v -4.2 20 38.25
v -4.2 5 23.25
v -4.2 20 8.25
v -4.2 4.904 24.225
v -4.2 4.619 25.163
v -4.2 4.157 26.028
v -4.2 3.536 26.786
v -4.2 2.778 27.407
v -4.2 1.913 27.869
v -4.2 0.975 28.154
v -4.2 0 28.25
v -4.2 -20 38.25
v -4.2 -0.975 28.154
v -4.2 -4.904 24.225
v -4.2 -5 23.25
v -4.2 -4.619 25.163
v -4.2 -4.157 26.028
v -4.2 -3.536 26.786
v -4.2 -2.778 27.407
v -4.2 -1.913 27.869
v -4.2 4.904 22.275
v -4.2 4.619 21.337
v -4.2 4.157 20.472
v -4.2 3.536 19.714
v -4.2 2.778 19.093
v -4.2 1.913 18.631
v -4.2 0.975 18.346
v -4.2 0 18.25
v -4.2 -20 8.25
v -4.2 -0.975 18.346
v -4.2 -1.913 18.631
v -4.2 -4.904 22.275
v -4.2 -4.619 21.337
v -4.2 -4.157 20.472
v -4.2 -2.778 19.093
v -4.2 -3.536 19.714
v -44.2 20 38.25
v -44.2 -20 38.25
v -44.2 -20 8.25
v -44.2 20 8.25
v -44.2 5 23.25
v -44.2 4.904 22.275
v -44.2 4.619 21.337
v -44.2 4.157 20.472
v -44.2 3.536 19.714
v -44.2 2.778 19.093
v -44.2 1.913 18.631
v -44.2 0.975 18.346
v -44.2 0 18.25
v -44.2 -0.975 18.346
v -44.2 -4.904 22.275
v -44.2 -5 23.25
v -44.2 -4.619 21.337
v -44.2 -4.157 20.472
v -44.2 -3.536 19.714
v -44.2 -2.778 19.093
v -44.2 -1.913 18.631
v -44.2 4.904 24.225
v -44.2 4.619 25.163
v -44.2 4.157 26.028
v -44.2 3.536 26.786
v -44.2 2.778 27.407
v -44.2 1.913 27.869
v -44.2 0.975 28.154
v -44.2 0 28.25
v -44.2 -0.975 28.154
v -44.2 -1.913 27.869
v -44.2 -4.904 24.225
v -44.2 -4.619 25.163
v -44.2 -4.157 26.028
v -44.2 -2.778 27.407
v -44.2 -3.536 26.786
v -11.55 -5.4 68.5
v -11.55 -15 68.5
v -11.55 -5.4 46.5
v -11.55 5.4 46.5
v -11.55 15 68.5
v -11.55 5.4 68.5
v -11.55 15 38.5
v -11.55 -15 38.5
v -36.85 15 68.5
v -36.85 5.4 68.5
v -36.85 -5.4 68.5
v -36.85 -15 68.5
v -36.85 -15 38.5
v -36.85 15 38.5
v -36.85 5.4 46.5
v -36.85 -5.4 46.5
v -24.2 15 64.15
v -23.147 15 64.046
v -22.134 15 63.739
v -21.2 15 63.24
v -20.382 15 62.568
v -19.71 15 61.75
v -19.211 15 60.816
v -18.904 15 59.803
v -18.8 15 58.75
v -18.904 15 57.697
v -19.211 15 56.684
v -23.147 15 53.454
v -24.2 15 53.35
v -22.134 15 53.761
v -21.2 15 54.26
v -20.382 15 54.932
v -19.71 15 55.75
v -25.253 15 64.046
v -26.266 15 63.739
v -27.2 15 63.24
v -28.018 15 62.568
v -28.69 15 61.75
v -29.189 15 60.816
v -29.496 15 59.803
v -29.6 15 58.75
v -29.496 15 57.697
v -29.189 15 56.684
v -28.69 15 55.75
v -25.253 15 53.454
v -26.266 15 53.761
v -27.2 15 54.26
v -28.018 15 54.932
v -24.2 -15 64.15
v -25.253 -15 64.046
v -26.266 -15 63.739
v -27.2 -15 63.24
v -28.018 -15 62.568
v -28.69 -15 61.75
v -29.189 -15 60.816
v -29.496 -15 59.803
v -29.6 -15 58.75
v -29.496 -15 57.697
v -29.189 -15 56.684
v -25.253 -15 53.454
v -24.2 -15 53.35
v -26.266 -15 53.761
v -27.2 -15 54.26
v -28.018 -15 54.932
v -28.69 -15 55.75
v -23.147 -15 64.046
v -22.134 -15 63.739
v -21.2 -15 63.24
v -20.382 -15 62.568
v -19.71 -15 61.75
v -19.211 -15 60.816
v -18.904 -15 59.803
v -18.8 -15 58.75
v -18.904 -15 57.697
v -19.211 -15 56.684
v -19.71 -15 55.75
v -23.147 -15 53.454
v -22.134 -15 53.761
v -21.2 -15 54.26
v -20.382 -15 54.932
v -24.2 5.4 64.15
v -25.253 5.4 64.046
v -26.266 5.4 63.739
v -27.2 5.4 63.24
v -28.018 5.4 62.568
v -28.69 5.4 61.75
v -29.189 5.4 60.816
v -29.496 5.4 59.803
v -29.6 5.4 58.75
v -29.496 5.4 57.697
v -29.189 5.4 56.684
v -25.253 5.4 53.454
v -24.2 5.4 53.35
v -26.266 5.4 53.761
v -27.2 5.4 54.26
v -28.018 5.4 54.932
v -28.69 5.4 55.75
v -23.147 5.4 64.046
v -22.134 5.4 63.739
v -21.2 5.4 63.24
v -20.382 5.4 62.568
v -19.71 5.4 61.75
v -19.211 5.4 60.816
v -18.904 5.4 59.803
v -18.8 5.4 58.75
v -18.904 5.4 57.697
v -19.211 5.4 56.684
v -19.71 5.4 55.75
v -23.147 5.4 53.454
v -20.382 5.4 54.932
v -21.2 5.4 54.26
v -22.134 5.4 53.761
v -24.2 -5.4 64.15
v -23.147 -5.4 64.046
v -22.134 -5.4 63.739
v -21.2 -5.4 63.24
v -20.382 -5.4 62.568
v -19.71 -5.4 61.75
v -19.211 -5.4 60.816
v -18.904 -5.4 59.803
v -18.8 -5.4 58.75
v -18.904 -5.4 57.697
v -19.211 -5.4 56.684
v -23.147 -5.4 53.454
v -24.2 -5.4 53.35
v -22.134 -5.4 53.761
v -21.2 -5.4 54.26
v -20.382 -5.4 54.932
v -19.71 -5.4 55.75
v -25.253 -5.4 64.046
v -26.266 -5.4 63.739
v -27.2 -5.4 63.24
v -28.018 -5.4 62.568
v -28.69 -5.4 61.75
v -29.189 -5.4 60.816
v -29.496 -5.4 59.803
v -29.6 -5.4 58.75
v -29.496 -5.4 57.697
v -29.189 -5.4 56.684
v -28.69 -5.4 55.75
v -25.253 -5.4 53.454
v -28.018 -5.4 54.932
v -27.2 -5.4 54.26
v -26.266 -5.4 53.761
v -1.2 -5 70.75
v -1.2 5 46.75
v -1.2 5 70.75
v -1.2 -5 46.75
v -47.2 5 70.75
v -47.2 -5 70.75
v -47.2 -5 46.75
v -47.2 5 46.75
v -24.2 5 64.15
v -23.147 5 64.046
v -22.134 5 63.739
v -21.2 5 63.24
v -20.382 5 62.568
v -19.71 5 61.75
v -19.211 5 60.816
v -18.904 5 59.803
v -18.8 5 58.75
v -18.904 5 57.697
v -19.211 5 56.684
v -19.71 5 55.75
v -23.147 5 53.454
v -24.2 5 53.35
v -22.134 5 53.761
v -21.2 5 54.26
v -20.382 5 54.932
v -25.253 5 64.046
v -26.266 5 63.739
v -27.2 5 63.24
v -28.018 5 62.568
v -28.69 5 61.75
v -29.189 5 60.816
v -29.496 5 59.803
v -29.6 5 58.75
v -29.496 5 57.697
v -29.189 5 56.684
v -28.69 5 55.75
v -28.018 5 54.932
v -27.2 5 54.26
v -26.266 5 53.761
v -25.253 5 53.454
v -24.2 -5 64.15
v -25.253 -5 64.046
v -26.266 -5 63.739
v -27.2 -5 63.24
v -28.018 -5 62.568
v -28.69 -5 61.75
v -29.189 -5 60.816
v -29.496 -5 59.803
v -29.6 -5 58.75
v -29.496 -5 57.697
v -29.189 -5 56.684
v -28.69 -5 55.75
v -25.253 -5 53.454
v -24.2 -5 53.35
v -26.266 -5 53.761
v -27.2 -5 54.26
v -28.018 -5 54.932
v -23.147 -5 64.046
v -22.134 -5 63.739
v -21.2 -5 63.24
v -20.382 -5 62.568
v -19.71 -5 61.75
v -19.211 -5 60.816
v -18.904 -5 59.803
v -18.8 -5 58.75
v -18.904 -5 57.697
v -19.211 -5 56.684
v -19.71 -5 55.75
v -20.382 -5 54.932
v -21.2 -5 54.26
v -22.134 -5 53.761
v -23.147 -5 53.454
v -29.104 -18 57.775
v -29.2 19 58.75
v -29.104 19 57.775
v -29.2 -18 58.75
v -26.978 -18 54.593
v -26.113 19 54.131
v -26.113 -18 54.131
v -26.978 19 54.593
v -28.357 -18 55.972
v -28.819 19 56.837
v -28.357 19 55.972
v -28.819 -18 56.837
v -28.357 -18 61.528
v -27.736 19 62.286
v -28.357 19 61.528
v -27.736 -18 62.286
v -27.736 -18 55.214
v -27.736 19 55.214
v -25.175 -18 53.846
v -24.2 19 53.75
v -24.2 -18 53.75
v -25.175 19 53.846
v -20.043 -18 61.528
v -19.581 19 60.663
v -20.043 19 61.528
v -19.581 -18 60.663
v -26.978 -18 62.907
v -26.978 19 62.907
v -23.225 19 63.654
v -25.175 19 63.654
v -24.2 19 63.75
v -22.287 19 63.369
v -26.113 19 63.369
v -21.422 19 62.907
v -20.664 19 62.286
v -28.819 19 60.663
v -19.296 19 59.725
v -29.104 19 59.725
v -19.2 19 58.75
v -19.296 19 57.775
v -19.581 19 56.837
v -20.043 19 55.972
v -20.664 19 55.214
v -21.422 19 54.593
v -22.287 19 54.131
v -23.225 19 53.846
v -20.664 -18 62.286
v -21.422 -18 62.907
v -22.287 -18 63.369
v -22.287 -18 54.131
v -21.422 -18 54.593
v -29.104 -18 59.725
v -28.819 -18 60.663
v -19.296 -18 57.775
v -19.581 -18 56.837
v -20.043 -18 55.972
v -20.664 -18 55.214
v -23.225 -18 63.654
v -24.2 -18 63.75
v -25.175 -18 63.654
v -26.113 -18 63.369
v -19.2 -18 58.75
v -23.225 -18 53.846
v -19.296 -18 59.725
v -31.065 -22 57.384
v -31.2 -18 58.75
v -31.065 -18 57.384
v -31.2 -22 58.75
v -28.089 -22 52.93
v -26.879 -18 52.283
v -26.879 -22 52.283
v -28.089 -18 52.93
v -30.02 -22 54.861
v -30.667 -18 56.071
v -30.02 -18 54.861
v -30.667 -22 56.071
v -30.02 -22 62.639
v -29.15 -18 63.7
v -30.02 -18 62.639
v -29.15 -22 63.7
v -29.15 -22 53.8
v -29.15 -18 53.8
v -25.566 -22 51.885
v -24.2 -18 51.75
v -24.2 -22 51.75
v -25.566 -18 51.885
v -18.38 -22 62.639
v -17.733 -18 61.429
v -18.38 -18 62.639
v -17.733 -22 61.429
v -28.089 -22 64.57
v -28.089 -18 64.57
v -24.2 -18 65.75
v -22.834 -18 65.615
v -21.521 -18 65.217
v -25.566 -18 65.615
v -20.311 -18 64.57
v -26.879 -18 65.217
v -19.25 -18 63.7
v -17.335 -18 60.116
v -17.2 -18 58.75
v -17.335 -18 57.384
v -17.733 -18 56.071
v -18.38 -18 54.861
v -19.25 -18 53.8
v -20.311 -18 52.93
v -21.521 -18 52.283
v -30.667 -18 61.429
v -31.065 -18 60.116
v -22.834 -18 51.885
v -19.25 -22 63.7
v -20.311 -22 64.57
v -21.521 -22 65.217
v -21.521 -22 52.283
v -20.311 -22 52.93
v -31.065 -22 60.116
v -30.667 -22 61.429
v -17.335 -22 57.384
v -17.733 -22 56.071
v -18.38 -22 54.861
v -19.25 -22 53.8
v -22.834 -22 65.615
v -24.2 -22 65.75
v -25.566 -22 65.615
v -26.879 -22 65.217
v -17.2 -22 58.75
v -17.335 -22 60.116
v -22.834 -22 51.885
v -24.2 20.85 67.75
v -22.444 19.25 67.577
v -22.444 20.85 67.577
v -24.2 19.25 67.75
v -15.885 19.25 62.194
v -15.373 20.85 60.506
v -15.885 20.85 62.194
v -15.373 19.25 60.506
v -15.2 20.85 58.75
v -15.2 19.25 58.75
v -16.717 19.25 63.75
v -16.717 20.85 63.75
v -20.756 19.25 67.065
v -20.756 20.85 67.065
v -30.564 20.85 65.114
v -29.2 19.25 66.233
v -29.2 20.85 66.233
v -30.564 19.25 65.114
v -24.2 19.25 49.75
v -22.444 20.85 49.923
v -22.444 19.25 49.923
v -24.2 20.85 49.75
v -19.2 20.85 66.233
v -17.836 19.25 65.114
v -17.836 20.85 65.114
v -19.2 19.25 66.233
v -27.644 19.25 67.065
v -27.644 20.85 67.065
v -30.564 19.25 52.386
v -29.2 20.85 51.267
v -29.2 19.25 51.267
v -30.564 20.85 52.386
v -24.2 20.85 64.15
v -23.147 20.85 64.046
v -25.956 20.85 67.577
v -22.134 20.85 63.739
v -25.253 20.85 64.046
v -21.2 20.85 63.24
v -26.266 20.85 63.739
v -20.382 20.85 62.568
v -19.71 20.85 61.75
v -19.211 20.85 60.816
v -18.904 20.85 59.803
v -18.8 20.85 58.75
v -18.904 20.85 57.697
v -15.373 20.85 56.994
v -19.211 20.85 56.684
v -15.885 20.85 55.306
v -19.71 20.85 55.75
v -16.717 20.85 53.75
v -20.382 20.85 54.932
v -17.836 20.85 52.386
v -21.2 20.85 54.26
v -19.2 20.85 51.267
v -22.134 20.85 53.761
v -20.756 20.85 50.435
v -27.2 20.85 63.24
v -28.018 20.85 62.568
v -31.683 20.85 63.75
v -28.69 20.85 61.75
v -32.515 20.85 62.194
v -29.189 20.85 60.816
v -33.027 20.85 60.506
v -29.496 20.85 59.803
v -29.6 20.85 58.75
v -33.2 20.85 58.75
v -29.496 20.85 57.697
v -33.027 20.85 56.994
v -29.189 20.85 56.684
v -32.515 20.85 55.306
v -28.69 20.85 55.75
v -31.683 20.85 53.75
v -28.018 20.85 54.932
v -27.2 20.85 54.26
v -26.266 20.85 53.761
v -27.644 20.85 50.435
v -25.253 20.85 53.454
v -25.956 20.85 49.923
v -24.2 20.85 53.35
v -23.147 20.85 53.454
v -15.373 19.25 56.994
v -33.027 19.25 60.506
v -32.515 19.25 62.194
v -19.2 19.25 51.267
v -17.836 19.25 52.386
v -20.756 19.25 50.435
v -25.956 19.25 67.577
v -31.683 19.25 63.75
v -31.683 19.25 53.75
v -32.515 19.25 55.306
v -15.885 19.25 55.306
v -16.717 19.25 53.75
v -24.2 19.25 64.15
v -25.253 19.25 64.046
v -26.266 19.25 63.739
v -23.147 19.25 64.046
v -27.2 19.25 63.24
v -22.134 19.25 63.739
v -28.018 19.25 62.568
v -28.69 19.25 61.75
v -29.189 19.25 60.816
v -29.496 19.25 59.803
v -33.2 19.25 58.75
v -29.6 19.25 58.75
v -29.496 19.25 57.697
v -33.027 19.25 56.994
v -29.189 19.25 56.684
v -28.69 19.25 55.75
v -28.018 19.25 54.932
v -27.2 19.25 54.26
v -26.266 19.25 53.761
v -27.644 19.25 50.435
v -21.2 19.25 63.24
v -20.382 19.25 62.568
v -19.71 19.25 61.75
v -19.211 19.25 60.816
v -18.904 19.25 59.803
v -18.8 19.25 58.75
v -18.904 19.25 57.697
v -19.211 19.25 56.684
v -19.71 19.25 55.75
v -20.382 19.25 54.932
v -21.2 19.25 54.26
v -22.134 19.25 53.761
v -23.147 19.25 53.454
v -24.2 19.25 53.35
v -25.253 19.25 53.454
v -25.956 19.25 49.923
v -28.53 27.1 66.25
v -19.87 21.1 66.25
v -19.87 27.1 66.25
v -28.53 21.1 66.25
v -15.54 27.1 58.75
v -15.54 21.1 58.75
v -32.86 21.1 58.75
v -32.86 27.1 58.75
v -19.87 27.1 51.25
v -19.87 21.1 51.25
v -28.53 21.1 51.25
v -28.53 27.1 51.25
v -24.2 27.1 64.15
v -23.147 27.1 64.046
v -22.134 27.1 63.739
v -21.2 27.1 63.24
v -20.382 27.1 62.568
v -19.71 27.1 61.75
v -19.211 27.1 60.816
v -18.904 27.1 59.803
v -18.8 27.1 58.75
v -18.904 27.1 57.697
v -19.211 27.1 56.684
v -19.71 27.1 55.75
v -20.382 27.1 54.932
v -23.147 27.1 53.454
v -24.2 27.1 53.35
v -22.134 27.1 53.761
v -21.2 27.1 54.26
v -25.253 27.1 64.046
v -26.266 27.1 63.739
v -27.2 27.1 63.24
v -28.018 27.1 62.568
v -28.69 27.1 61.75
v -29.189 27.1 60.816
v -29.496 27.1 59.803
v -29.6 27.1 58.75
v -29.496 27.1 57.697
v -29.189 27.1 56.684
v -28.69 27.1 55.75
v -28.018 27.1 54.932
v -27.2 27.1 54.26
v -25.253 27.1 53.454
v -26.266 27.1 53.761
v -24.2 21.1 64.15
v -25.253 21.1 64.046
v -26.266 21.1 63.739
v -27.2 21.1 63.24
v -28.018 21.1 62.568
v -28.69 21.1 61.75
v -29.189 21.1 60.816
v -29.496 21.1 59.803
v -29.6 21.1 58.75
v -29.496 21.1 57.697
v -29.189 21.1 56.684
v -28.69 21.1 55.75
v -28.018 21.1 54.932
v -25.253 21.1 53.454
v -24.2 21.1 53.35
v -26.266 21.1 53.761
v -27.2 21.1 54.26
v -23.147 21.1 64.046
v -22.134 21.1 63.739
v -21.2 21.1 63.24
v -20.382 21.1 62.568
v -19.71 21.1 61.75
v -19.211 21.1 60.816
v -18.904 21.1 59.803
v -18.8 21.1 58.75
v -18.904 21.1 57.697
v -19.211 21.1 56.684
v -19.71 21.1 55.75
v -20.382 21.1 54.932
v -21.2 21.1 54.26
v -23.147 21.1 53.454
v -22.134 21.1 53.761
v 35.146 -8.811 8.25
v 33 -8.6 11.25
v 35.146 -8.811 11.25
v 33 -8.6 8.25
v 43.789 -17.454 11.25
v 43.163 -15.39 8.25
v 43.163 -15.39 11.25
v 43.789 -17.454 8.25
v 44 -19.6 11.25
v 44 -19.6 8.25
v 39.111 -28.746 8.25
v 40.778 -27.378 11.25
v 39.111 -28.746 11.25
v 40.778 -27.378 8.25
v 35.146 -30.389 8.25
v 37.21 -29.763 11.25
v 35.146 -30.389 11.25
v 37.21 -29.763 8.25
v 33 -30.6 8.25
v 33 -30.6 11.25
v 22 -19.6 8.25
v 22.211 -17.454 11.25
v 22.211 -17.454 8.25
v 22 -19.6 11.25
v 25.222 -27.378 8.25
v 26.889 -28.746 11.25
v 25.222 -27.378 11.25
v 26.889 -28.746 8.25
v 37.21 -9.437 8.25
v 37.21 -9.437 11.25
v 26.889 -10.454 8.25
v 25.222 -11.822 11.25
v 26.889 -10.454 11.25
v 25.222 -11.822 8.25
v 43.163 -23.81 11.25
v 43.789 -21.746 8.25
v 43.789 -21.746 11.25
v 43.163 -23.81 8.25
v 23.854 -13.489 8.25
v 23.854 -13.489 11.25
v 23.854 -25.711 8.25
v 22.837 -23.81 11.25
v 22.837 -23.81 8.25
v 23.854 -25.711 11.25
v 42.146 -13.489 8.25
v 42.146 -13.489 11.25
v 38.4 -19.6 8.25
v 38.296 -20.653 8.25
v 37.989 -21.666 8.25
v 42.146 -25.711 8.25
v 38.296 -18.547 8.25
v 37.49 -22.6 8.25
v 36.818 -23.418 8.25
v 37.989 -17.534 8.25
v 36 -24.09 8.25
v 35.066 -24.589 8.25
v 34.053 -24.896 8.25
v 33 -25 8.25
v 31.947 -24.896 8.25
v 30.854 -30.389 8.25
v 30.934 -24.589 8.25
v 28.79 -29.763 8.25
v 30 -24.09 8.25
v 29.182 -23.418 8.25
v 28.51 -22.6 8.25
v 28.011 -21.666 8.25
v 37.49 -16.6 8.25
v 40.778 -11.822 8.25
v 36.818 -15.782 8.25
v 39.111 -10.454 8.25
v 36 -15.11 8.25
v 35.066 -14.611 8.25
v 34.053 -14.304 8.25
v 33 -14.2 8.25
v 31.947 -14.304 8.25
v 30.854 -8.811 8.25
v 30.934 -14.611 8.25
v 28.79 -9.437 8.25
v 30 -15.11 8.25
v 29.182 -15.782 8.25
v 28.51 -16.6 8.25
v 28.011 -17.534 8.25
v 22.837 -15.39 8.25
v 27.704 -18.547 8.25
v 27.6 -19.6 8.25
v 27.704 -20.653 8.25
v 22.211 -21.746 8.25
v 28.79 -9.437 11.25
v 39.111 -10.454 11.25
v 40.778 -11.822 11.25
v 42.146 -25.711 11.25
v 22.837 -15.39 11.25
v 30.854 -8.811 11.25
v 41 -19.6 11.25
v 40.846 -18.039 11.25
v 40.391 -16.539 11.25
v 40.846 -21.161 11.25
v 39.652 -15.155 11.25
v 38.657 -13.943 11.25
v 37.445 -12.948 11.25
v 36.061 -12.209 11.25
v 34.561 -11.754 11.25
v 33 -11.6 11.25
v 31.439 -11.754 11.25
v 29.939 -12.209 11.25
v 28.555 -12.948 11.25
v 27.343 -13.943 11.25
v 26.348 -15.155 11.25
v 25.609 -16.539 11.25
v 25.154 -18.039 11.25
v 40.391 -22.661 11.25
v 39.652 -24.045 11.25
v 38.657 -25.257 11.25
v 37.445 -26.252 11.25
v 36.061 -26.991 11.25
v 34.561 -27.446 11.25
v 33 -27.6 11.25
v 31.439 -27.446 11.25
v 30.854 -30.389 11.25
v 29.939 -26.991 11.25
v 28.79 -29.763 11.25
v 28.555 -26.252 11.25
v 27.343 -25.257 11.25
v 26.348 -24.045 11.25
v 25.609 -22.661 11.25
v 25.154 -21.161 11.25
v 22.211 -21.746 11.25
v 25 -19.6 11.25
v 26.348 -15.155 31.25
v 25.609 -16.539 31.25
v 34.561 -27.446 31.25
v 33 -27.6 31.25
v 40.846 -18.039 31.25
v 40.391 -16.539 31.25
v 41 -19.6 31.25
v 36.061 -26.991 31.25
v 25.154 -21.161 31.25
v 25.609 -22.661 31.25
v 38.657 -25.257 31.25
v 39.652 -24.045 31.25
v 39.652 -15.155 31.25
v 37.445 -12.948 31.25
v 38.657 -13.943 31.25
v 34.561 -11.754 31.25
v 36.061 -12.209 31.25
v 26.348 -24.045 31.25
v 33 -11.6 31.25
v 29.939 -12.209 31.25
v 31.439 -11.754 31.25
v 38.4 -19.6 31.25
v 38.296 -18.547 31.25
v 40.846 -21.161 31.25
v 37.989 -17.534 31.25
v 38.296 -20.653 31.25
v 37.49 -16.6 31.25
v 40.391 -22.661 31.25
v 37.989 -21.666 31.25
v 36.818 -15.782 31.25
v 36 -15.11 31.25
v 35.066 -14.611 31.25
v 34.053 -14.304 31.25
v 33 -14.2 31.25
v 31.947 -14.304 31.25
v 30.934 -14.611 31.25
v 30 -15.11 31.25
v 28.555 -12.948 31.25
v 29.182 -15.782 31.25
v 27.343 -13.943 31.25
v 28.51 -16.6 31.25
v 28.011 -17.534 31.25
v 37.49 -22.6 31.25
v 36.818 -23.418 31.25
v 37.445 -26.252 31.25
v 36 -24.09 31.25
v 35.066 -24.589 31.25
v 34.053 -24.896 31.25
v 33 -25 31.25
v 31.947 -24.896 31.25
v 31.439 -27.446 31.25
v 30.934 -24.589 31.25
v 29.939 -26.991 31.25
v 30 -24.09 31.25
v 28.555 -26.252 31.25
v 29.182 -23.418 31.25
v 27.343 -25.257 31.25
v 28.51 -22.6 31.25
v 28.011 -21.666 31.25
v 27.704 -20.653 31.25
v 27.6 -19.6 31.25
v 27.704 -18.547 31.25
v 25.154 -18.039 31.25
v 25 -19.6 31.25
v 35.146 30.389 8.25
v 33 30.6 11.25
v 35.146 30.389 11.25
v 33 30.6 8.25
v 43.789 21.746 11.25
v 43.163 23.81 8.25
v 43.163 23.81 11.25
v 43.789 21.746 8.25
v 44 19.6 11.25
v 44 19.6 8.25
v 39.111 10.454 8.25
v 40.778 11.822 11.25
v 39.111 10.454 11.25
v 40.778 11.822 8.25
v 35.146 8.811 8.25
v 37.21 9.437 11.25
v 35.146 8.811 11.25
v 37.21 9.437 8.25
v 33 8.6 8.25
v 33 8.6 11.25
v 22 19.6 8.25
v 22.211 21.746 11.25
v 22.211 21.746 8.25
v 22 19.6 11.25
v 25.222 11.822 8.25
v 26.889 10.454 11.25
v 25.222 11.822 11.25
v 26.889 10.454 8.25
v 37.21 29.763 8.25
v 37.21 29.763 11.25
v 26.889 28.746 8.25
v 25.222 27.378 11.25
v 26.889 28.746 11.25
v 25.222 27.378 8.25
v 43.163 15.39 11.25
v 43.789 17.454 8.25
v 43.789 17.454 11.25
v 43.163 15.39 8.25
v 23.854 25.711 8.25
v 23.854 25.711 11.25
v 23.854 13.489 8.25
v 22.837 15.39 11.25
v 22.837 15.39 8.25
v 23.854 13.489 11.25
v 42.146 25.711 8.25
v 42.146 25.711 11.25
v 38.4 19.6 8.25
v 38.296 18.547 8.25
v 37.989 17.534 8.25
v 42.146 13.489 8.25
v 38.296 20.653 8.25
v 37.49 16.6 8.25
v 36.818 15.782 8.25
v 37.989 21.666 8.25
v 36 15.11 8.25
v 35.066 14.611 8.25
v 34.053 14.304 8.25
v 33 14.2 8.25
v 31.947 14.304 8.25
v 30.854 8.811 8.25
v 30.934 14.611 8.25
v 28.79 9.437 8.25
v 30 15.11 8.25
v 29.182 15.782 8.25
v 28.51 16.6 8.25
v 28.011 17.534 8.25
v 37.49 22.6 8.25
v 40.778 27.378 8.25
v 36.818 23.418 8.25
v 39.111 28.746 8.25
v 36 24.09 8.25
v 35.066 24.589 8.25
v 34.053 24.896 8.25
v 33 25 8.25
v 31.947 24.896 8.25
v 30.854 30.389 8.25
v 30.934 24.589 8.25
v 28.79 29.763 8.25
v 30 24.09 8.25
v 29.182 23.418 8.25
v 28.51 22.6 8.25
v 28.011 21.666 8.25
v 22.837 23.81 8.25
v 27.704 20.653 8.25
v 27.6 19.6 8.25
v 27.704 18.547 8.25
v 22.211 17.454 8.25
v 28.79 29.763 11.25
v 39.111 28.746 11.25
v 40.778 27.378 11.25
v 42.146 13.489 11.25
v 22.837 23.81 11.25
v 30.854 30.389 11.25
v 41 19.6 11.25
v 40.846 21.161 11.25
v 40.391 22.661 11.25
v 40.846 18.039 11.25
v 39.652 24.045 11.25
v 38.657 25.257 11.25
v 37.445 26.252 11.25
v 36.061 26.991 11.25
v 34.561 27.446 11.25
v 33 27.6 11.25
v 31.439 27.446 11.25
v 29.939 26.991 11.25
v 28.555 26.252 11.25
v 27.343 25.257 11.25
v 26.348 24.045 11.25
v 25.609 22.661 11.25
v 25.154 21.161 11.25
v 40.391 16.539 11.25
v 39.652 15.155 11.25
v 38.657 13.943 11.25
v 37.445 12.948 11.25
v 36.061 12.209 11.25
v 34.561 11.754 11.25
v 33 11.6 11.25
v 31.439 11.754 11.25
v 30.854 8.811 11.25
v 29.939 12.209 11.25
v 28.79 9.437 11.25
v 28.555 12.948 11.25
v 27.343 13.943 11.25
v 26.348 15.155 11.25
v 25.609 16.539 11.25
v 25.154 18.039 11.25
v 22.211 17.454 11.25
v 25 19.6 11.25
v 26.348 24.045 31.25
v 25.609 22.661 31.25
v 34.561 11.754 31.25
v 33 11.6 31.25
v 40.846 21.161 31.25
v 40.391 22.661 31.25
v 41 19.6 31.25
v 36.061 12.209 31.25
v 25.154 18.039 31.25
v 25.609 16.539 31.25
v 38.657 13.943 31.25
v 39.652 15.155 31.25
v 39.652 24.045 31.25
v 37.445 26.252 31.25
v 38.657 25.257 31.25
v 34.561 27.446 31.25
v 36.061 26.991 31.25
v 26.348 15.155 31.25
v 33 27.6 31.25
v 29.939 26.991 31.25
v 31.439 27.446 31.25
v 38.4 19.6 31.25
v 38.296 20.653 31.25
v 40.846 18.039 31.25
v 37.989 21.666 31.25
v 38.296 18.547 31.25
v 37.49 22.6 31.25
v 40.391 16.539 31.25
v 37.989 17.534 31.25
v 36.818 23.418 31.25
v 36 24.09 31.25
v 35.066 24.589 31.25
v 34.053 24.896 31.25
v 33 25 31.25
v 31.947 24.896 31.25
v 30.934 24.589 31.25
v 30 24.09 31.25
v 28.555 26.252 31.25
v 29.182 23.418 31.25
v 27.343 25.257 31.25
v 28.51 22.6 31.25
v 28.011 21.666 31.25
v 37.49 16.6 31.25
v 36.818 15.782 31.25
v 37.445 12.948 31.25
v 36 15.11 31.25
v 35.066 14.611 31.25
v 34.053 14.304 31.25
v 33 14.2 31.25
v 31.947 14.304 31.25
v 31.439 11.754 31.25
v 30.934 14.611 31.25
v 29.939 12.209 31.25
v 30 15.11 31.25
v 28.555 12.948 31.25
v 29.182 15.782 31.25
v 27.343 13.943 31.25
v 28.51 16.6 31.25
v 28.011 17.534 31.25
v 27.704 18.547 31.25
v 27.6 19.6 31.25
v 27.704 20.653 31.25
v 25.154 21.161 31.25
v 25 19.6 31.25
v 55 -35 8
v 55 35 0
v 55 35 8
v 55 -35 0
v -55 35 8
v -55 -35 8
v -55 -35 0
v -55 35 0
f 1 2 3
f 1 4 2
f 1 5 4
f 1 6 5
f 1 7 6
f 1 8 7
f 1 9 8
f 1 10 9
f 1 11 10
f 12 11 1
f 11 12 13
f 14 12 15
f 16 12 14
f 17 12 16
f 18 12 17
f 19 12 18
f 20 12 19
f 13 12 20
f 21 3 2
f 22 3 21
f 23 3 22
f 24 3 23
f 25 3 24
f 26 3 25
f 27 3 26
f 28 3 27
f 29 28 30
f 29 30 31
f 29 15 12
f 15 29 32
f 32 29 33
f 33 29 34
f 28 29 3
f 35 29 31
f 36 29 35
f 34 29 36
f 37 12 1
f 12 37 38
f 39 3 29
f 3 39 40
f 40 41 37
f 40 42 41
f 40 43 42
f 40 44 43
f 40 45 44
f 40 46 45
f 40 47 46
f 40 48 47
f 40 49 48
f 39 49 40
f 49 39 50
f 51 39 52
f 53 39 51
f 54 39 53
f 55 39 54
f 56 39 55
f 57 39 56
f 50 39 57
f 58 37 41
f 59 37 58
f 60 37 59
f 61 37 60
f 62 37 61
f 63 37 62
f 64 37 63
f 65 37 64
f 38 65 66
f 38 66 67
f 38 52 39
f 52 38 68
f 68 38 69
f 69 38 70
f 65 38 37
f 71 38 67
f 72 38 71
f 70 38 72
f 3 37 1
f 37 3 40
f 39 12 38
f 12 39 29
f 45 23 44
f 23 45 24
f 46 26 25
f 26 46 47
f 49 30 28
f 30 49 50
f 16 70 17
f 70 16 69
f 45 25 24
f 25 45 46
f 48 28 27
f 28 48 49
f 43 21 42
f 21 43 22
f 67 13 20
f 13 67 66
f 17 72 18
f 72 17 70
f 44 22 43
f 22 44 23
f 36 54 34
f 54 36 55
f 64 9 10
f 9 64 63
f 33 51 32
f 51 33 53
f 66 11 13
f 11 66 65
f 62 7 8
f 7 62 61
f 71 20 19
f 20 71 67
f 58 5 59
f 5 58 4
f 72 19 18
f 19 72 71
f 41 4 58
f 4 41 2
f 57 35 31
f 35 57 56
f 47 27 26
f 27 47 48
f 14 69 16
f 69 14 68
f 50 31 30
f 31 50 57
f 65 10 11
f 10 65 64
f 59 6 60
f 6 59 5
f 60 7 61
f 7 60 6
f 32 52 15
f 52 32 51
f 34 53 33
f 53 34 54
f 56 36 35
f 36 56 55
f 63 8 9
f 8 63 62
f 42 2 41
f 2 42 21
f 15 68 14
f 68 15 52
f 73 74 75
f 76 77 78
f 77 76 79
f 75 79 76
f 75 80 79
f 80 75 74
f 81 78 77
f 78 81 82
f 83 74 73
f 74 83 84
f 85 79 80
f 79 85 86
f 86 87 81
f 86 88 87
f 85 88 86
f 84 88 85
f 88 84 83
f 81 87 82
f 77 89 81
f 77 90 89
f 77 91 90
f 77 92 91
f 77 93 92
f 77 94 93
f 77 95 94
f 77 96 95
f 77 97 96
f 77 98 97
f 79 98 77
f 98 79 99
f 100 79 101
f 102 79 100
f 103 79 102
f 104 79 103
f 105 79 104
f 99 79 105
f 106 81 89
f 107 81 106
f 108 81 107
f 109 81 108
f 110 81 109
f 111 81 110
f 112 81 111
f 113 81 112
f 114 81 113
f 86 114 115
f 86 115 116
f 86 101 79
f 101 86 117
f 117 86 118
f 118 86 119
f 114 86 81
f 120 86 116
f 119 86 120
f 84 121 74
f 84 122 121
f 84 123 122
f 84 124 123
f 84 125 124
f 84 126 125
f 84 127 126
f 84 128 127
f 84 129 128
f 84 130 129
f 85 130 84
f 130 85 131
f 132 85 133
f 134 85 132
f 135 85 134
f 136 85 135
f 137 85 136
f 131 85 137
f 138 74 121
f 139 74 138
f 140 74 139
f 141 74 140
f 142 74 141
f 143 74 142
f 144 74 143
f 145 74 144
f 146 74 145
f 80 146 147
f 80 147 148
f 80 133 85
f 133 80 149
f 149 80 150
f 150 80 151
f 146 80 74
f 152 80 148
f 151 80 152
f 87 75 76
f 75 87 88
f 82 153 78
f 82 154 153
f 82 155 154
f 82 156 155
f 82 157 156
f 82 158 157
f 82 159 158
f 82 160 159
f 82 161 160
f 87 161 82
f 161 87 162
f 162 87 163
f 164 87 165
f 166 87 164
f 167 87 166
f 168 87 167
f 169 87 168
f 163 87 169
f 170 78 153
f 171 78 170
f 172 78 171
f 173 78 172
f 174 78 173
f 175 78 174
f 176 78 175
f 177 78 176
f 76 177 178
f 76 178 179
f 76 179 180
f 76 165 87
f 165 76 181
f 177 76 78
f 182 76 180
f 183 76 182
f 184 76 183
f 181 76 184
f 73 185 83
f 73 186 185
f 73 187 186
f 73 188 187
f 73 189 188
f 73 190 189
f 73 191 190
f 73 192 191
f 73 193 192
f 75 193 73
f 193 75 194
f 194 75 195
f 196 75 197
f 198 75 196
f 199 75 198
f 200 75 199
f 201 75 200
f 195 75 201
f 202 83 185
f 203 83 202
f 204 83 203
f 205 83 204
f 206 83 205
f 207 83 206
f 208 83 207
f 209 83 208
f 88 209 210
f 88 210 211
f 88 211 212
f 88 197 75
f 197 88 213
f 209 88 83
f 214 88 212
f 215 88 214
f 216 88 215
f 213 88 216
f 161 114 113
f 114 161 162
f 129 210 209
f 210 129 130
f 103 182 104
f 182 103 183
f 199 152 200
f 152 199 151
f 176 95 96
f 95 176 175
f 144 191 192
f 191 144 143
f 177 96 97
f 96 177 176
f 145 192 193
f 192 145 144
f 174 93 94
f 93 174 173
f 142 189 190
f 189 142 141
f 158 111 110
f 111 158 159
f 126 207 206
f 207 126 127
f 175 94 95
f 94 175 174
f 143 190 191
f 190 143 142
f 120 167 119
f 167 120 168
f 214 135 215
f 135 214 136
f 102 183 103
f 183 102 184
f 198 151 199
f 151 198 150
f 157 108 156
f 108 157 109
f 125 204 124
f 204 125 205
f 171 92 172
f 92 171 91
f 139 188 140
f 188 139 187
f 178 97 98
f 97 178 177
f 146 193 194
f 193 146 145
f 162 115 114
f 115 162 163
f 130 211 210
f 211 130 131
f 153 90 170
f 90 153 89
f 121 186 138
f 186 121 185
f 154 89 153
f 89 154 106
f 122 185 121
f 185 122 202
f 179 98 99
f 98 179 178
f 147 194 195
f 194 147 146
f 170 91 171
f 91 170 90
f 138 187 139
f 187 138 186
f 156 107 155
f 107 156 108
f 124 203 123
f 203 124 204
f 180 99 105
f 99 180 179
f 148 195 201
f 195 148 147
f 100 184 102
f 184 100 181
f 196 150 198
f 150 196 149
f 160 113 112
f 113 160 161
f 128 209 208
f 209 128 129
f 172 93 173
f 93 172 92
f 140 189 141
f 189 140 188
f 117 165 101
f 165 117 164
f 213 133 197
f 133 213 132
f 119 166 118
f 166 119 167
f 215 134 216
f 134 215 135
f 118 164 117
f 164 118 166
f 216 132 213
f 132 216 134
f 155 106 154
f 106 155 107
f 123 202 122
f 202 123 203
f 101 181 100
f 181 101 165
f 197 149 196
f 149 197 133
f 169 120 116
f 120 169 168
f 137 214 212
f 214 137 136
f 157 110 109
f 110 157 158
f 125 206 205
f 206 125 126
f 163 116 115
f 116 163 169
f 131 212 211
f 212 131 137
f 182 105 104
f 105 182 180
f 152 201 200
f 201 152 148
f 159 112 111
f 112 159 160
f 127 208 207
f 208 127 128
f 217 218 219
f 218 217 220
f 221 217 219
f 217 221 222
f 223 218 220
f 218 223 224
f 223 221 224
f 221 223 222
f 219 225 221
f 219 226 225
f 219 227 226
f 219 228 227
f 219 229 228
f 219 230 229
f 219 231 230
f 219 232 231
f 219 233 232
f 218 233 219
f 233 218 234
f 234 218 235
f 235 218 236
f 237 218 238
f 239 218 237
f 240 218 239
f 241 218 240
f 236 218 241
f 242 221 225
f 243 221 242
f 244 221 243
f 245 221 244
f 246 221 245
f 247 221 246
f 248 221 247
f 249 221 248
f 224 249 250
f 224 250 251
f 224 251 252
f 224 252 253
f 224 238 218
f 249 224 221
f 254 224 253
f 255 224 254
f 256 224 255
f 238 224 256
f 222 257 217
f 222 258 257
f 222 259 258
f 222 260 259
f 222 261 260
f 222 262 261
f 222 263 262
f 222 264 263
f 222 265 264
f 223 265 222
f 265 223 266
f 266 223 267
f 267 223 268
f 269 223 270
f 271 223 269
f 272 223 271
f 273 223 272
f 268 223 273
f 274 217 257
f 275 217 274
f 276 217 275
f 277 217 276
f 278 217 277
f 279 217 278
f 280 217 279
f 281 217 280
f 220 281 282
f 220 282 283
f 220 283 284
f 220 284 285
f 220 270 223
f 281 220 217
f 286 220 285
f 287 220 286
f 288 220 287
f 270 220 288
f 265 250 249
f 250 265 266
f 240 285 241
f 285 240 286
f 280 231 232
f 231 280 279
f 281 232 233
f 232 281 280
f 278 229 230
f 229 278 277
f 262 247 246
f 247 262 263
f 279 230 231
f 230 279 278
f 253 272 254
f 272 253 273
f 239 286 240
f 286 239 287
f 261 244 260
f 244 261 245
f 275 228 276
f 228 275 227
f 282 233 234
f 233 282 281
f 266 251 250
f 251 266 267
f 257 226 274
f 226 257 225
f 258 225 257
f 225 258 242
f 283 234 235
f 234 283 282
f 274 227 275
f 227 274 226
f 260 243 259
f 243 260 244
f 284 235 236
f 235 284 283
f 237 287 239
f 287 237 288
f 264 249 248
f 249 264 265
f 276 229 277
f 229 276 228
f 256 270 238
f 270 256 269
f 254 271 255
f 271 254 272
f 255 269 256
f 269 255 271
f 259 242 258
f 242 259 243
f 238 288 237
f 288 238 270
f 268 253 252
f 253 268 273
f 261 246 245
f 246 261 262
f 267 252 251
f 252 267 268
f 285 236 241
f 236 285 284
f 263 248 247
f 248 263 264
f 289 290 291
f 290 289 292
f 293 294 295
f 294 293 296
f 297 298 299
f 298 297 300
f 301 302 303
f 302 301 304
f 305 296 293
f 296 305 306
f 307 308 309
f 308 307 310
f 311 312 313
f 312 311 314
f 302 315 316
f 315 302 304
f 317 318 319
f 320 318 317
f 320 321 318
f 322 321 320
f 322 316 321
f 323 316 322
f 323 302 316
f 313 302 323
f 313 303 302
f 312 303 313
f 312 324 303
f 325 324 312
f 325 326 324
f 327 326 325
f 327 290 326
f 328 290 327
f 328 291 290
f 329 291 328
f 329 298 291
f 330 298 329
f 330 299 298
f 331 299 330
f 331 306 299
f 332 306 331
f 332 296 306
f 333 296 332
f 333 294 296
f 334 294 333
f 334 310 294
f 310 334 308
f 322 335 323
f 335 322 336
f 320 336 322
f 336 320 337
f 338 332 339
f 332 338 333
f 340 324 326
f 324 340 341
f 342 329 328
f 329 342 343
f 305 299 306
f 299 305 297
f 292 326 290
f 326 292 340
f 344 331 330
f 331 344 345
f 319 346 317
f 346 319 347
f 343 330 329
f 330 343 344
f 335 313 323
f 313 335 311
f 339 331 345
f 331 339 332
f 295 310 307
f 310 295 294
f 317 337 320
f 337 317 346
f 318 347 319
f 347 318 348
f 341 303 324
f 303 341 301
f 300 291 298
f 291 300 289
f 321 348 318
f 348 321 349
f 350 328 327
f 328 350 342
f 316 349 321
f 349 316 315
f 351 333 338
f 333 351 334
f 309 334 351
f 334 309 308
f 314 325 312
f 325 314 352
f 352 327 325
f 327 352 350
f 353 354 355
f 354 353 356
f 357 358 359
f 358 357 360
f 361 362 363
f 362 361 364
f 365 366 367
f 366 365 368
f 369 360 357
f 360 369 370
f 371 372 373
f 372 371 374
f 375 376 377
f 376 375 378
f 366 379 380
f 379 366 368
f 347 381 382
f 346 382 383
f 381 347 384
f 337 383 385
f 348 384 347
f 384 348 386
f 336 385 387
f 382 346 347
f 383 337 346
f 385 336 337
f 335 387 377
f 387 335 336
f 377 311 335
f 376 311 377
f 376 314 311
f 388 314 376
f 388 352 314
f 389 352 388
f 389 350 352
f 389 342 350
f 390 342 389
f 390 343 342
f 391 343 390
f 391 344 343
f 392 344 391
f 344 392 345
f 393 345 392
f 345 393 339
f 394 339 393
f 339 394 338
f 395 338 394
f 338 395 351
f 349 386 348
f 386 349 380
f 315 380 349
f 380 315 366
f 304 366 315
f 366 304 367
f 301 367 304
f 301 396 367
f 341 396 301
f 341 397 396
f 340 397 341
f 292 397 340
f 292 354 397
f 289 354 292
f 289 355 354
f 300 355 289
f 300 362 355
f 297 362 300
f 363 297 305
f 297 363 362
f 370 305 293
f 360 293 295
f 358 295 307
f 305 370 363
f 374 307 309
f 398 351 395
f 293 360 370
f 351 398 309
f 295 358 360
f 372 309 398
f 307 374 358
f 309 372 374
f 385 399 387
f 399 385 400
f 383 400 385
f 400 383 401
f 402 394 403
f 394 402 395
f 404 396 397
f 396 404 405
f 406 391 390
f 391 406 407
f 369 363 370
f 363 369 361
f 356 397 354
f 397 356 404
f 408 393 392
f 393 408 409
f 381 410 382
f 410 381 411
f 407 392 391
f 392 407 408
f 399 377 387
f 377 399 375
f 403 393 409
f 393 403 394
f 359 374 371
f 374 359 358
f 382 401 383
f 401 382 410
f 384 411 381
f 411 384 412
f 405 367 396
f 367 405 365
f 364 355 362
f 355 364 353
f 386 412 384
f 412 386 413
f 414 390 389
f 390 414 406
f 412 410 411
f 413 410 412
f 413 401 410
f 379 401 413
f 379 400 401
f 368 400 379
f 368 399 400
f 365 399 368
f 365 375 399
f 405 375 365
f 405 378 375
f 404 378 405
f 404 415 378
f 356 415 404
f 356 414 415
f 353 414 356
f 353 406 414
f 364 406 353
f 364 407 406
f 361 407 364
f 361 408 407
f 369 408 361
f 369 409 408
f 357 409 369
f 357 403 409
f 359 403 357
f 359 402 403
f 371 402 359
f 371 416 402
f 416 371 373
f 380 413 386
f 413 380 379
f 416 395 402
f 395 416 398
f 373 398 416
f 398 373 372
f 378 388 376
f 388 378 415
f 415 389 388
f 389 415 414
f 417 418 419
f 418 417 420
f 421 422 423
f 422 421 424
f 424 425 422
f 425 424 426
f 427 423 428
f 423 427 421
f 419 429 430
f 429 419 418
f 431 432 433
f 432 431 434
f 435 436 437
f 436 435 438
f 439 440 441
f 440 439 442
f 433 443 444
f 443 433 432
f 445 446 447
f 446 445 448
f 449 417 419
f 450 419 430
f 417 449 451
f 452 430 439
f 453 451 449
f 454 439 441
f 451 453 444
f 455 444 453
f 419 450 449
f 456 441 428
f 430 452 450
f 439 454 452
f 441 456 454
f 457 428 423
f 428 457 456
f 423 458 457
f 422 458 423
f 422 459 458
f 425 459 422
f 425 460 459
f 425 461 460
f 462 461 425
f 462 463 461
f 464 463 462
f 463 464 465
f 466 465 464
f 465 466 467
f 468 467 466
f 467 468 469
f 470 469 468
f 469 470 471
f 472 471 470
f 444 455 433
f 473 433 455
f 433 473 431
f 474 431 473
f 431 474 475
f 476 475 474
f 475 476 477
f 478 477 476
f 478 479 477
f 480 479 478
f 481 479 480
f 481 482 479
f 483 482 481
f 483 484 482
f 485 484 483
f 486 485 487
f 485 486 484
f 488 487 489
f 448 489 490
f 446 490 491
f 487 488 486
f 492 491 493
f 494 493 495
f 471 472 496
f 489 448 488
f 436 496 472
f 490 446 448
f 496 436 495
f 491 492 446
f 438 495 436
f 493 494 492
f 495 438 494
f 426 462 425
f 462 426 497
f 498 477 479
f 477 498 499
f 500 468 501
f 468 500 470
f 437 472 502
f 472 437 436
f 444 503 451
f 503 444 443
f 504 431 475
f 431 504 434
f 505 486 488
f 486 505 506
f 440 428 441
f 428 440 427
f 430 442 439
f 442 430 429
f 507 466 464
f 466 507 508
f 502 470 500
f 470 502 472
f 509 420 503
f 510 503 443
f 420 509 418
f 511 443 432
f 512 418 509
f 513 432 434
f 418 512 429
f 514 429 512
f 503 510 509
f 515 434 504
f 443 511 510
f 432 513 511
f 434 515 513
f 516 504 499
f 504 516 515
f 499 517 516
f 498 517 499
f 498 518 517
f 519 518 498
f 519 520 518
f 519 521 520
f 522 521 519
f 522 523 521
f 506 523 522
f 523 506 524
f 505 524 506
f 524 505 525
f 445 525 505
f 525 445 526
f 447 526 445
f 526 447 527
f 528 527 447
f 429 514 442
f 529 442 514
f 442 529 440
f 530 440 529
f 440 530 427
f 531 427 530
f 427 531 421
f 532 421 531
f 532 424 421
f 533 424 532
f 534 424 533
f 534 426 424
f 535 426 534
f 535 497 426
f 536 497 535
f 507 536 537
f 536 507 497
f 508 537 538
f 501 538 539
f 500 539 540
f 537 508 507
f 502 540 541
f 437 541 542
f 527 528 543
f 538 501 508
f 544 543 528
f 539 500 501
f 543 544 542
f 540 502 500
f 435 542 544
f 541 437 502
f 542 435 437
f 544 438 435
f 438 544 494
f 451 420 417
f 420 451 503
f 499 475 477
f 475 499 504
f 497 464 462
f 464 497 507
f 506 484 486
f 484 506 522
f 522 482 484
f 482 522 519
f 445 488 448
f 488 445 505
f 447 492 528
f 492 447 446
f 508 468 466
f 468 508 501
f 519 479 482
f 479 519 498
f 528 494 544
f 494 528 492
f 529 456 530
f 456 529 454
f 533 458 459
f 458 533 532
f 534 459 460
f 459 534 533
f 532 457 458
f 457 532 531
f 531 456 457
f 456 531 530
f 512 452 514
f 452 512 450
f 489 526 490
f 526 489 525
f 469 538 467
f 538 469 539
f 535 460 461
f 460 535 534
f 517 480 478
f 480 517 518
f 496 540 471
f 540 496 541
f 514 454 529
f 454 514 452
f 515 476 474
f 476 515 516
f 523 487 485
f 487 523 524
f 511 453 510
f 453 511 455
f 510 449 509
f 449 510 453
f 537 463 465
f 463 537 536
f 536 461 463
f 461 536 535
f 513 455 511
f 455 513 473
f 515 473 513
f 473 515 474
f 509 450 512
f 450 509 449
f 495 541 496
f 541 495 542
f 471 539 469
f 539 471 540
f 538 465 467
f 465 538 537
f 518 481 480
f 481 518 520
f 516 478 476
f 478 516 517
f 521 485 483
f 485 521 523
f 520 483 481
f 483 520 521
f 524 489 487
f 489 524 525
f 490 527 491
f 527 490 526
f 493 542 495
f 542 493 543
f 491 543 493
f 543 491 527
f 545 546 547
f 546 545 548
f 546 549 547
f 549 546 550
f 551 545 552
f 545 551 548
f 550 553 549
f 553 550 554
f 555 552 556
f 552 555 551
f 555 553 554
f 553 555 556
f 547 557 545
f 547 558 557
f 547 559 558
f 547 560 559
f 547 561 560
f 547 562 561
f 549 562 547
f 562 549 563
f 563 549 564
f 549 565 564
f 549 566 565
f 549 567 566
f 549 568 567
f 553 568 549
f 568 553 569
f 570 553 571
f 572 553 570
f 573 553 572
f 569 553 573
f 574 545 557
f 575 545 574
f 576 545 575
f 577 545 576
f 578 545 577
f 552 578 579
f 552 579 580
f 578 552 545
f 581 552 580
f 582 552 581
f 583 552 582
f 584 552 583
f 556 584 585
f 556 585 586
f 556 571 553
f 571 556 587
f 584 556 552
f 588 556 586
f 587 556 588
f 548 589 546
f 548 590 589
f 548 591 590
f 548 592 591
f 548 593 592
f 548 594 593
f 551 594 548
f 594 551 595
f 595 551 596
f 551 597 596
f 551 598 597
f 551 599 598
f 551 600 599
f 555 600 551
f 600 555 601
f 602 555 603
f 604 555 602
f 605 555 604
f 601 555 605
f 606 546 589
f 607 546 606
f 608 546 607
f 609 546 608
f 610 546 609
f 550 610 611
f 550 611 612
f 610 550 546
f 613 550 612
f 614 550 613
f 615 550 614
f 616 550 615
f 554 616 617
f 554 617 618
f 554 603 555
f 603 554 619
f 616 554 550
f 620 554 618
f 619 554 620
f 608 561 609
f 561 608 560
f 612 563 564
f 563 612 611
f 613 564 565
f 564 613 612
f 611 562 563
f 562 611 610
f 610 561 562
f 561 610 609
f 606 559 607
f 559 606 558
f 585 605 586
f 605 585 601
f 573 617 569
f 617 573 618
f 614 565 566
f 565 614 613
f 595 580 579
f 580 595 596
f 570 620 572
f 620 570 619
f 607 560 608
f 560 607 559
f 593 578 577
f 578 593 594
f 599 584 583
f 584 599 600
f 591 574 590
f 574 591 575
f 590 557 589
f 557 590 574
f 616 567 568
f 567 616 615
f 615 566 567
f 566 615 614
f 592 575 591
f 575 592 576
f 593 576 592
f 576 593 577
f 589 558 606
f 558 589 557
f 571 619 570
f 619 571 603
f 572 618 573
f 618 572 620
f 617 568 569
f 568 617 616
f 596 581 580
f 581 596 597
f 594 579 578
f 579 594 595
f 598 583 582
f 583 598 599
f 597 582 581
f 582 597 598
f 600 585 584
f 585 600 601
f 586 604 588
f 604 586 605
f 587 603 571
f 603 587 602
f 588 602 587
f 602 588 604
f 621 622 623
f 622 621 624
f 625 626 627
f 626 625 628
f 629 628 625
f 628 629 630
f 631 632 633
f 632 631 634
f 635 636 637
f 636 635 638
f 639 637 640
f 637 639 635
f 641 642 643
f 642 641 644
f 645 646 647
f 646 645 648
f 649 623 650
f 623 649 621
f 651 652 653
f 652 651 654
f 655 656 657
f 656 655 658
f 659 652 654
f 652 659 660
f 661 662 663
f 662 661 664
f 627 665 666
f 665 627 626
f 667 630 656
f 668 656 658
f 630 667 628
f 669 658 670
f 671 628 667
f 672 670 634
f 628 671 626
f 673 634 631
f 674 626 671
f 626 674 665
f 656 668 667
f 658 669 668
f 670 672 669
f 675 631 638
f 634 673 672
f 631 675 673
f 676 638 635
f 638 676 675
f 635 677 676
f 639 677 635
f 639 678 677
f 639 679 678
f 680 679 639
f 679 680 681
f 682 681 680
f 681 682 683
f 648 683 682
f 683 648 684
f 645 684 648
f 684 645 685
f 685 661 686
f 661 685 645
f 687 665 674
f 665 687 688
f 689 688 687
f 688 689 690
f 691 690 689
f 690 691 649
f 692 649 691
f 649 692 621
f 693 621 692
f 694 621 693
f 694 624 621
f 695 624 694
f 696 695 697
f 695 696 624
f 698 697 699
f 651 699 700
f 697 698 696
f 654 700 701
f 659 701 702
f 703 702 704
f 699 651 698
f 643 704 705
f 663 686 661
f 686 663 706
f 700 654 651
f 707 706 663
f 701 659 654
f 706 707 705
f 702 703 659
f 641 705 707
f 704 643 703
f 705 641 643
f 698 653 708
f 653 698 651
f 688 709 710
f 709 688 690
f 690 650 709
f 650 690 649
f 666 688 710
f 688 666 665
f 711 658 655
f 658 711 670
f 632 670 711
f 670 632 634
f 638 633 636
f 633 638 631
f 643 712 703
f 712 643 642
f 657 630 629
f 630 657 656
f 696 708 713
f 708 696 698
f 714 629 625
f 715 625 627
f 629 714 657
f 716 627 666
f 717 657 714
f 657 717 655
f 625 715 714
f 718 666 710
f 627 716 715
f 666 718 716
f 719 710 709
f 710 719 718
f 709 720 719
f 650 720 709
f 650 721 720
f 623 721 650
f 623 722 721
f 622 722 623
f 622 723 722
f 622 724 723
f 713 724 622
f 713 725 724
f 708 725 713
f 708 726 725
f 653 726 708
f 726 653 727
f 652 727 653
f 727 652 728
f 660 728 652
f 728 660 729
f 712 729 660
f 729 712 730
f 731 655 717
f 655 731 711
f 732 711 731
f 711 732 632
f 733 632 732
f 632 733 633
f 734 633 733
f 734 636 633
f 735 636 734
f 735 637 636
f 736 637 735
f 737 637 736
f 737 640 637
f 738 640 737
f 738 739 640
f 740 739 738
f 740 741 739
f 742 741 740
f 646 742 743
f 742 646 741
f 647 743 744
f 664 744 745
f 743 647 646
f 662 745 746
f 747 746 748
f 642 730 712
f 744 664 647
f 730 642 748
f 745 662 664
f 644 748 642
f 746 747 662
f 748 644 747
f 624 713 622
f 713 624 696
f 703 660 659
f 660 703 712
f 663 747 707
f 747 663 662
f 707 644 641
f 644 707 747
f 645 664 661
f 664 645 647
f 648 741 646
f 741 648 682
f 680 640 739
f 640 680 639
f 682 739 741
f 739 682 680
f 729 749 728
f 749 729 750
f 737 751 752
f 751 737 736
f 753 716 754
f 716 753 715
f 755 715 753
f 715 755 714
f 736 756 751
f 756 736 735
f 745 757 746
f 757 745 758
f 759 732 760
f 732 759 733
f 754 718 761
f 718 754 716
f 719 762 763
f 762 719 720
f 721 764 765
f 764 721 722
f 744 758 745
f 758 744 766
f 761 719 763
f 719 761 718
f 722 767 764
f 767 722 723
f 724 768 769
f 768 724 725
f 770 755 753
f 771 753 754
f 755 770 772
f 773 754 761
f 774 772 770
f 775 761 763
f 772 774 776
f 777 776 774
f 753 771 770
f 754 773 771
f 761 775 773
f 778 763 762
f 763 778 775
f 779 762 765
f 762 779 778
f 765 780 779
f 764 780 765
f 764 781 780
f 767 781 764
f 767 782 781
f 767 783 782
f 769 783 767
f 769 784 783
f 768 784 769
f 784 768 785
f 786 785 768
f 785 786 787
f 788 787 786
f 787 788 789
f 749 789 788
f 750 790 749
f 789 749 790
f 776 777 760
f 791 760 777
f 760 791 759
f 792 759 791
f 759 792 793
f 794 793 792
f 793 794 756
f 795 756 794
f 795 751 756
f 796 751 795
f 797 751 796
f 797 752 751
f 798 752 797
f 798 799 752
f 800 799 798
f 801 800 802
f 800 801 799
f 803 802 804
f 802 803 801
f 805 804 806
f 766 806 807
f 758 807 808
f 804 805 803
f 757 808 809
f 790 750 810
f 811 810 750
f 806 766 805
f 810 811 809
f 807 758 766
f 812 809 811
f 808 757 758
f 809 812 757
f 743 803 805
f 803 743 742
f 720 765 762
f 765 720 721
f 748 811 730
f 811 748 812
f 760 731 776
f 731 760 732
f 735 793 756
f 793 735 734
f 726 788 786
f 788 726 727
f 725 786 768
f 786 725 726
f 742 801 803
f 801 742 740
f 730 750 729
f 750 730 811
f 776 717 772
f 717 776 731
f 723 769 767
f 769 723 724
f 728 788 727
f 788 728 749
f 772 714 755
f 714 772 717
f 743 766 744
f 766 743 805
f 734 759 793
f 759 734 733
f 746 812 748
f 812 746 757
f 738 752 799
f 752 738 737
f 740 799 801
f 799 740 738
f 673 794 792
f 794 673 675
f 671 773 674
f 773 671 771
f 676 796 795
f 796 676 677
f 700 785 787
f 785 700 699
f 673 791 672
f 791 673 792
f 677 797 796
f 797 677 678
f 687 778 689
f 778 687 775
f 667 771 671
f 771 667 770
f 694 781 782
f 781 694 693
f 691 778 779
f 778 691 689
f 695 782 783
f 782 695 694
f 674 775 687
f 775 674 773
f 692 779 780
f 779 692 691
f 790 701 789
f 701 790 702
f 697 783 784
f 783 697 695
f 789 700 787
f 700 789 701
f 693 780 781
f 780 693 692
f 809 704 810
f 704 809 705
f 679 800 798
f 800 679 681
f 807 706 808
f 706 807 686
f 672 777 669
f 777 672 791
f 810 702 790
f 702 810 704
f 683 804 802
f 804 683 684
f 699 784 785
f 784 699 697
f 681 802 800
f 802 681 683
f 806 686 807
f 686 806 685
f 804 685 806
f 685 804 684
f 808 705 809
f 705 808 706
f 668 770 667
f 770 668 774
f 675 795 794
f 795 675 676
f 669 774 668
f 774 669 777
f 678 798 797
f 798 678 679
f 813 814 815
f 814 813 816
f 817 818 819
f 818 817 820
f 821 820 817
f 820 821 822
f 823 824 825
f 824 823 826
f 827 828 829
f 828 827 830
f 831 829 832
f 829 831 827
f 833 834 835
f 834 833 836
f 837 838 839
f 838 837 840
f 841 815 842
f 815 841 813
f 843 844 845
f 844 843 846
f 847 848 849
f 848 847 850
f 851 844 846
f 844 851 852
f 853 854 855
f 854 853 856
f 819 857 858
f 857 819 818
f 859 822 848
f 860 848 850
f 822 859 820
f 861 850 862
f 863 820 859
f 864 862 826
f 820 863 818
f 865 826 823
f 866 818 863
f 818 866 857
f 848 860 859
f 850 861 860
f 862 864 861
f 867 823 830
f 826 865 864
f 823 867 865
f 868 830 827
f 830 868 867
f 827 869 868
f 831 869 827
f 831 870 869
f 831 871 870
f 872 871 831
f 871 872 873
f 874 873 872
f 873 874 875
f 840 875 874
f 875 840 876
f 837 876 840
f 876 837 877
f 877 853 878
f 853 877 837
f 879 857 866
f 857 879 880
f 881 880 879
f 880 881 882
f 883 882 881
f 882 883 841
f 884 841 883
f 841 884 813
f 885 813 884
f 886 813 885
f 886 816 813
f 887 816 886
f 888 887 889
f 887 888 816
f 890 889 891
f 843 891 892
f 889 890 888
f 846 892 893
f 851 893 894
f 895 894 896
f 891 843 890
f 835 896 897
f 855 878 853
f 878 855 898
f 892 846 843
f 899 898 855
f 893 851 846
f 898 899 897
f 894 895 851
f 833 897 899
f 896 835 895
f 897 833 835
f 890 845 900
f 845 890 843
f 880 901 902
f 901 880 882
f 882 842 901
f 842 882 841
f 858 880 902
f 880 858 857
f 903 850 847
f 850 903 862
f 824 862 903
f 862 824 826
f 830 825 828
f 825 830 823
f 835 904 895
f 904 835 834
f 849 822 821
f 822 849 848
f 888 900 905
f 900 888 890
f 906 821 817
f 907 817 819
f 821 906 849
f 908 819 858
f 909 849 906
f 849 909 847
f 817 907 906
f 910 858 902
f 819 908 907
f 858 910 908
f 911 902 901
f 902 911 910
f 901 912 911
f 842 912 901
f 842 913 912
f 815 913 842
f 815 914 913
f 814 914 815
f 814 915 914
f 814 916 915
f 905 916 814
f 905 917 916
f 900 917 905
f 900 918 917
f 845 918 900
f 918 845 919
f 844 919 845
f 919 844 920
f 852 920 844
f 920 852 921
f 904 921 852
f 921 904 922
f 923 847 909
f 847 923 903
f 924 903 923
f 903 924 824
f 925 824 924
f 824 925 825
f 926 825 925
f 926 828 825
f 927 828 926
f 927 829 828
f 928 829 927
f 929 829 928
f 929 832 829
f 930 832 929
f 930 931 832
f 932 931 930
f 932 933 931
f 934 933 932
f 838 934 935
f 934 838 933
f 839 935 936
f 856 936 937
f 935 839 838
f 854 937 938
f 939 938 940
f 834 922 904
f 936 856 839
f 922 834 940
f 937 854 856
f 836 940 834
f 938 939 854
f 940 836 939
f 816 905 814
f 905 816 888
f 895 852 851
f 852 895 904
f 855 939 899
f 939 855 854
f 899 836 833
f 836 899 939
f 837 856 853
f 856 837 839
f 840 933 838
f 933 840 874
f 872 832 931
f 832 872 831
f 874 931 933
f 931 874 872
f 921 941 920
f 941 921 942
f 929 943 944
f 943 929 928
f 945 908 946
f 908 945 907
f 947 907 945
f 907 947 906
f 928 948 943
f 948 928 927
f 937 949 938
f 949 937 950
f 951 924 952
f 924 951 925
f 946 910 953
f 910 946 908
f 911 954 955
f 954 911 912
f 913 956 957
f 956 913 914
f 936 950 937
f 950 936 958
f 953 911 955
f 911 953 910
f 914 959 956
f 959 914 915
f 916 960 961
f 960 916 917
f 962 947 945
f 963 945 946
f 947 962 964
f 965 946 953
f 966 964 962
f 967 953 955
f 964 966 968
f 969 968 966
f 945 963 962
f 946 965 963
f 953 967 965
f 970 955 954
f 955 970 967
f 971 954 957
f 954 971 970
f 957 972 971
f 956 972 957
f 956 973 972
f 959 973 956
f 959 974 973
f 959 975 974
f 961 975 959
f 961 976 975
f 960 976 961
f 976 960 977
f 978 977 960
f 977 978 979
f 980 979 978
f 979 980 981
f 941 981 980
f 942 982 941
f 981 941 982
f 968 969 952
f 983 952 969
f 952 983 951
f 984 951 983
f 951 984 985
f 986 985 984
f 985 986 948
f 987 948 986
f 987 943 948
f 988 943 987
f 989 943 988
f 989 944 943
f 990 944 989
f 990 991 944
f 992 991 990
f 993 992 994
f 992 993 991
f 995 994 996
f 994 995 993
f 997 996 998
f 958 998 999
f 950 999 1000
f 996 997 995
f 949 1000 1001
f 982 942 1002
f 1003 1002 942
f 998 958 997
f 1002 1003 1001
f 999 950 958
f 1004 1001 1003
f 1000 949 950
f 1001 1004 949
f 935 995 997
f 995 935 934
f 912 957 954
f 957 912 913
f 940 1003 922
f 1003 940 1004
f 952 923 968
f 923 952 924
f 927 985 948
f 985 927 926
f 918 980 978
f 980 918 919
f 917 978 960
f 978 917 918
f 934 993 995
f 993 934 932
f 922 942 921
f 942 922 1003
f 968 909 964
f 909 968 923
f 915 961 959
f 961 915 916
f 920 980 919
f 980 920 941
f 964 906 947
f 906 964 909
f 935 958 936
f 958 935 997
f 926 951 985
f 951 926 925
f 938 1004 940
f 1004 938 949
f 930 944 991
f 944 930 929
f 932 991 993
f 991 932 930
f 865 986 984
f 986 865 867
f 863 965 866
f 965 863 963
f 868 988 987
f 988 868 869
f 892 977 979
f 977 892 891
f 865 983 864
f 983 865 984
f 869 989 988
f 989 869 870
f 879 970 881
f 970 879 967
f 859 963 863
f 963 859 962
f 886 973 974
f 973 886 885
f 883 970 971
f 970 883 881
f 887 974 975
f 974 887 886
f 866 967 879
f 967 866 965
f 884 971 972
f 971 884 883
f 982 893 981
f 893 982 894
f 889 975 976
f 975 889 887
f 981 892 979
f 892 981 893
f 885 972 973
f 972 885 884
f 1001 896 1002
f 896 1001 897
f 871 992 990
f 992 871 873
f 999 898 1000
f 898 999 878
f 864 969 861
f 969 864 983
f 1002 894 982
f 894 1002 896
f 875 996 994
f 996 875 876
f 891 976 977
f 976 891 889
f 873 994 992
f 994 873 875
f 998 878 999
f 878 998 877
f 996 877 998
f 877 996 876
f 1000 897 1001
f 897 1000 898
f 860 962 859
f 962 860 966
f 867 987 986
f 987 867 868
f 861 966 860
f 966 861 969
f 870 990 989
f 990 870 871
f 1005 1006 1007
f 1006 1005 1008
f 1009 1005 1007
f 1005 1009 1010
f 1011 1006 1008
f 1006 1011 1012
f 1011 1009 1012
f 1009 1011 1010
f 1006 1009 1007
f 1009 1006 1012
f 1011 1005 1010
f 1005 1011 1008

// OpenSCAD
$fn = 32;

// ------------------------------------------------------------------------
// Indexing jig: plate 110 x 70 mm, pin d10
// Every part is its own module, assembly() places every instance.
// ------------------------------------------------------------------------

// --- part 1 ---
module jig_plate() {
  difference() {
    translate([-55, -35, 0]) cube([110, 70, 8]);
  }
}

// --- part 2 ---
module locator_block() {
  difference() {
    translate([-20, -20, 0]) cube([40, 40, 30]);
    translate([0, 0, 15]) rotate([0, 90, 0]) cylinder(h = 42, d = 10, center = true);
  }
}

// --- part 3 ---
module index_fork() {
  difference() {
    translate([-12.65, -15, 0]) cube([25.3, 30, 30]);
    translate([-13.65, -5.4, 8]) cube([27.3, 10.8, 23]);
    translate([0, 0, 20.25]) rotate([90, 0, 0]) cylinder(h = 32, d = 10.8, center = true);
  }
}

// --- part 4 ---
module index_arm() {
  difference() {
    translate([-23, -5, 0]) cube([46, 10, 24]);
    translate([0, 0, 12]) rotate([90, 0, 0]) cylinder(h = 12, d = 10.8, center = true);
  }
}

// --- part 5 ---
module index_pin() {
  rotate([0, 90, 0]) cylinder(h = 38, d = 10, center = true);
  translate([-22, 0, 0]) rotate([0, 90, 0]) cylinder(h = 4, d = 14);
}

// --- part 6 ---
module pin_washer() {
  difference() {
      translate([0, 0, 0]) cylinder(h = 1.6, d = 18);
      translate([0, 0, -1]) cylinder(h = 3.6, d = 10.8);
    }
}

// --- part 7 ---
module lock_nut() {
  difference() {
    linear_extrude(height = 6) polygon(points = [[8.66, 0], [4.33, 7.5], [-4.33, 7.5], [-8.66, 0], [-4.33, -7.5], [4.33, -7.5]]);
    translate([0, 0, -1]) cylinder(h = 8, d = 10.8);
  }
}

// --- part 8 ---
module guide_bush_a() {
  difference() {
    union() {
      cylinder(h = 3, d = 22);
      translate([0, 0, 3]) cylinder(h = 20, d = 16);
    }
    translate([0, 0, -1]) cylinder(h = 25, d = 10.8);
  }
}

// --- part 9 ---
module guide_bush_b() {
  difference() {
    union() {
      cylinder(h = 3, d = 22);
      translate([0, 0, 3]) cylinder(h = 20, d = 16);
    }
    translate([0, 0, -1]) cylinder(h = 25, d = 10.8);
  }
}

// --- assembly ---
module assembly() {
  color([0.80, 0.24, 0.20]) translate([0, 0, 0]) rotate([0, 0, 0]) jig_plate();
  color([0.20, 0.45, 0.75]) translate([-24.2, 0, 8.25]) rotate([0, 0, 0]) locator_block();
  color([0.25, 0.62, 0.32]) translate([-24.2, 0, 38.5]) rotate([0, 0, 0]) index_fork();
  color([0.92, 0.70, 0.18]) translate([-24.2, 0, 46.75]) rotate([0, 0, 0]) index_arm();
  color([0.58, 0.35, 0.70]) translate([-24.2, 0, 58.75]) rotate([0, 0, 90]) index_pin();
  color([0.16, 0.66, 0.66]) translate([-24.2, 20.85, 58.75]) rotate([90, 0, 0]) pin_washer();
  color([0.85, 0.48, 0.18]) translate([-24.2, 27.1, 58.75]) rotate([90, 0, 0]) lock_nut();
  color([0.55, 0.60, 0.65]) translate([33, -19.6, 8.25]) rotate([0, 0, 0]) guide_bush_a();
  color([0.75, 0.30, 0.55]) translate([33, 19.6, 8.25]) rotate([0, 0, 0]) guide_bush_b();
}

assembly();
